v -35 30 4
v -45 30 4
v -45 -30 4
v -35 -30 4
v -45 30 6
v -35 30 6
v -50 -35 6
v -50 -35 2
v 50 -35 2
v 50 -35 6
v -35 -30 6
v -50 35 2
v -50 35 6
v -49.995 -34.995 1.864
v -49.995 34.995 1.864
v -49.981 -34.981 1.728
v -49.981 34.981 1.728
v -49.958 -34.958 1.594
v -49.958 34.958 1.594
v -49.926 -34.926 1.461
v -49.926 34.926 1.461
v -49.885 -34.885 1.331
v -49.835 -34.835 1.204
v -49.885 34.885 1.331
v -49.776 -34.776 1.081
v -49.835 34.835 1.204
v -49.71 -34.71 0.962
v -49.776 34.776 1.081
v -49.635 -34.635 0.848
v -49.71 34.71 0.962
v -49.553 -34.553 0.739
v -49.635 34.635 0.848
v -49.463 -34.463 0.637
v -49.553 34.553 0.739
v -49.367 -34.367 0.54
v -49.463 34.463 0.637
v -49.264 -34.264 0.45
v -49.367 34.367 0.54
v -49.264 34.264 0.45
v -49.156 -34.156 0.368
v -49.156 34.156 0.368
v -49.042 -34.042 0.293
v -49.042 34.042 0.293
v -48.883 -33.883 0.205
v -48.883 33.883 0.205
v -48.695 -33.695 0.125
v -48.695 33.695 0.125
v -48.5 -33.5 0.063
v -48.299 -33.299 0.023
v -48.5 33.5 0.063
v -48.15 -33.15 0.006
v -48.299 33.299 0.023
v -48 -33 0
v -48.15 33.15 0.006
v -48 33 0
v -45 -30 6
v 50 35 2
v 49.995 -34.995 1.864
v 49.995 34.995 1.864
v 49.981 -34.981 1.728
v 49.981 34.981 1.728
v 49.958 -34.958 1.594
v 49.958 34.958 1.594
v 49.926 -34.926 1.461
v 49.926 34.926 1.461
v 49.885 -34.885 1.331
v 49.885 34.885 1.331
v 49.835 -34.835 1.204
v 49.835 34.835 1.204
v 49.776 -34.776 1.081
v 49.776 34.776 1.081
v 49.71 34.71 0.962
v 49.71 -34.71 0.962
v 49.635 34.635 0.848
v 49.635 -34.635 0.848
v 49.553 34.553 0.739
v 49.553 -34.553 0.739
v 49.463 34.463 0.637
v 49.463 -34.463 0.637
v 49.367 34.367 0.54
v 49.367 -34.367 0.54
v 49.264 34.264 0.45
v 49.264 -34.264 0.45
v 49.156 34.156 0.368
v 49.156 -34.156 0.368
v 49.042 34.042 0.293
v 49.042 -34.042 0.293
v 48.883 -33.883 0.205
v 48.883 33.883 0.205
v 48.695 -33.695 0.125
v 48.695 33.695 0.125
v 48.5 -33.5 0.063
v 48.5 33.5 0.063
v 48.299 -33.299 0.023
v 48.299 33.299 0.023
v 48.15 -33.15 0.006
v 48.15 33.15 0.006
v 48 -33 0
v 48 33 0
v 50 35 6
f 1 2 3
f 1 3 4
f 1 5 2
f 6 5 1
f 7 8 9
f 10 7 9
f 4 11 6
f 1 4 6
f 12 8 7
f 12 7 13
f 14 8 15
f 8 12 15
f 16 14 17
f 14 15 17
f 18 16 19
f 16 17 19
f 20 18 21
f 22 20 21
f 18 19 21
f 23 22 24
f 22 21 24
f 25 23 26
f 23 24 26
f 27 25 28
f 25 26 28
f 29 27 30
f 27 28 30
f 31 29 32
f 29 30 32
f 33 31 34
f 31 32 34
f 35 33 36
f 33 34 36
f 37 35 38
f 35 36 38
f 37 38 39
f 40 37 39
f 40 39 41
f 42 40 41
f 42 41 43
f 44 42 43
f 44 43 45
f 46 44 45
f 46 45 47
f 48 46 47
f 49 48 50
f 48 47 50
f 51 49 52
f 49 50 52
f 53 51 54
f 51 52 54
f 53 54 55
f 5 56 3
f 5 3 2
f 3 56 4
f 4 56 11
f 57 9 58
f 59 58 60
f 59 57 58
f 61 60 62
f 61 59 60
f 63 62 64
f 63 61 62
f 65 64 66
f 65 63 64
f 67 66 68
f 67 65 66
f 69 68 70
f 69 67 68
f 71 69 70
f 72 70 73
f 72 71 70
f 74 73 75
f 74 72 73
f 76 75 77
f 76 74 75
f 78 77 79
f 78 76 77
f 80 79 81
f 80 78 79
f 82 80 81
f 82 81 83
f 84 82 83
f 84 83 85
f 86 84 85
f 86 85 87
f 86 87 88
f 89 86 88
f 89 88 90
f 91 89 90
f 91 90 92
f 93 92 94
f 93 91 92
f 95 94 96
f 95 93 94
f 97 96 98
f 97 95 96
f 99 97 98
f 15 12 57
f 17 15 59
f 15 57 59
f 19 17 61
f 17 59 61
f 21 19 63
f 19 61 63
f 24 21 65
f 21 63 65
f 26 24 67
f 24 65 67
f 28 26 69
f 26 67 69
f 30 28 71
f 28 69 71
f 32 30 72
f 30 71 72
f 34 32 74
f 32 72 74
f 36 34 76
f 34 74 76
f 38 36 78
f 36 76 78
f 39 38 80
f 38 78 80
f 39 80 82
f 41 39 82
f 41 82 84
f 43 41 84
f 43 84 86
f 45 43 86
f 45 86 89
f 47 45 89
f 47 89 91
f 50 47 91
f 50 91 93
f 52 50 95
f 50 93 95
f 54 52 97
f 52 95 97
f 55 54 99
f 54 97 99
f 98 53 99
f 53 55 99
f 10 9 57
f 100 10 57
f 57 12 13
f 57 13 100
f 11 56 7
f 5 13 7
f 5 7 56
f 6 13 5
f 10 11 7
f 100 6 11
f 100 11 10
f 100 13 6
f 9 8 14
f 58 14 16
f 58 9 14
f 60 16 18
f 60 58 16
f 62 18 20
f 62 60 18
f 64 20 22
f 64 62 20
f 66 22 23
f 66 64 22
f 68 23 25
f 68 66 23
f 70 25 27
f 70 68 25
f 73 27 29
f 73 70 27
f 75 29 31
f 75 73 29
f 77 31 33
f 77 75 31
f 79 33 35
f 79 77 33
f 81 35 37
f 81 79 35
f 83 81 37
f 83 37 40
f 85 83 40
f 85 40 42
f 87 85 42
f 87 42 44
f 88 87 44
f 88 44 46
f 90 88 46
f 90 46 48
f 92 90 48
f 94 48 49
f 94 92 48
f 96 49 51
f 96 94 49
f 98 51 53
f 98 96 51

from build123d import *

# Parameters (mm, degrees)
F0_W     = 100
F0_H     = 70
F1_DEPTH = 6
F2_R     = 2
F3_W     = 10
F3_H     = 60
F4_DEPTH = 2


with BuildPart() as f1:
    # F0 (on Top) → F1 (new body)
    with BuildSketch(Plane.XY):
        Rectangle(F0_W, F0_H)
    extrude(amount=F1_DEPTH)

    # F2
    f2_edges = [f1.edges().sort_by_distance(p)[0] for p in [
        (0, -35, 0),
        (50, 0, 0),
        (0, 35, 0),
        (-50, 0, 0),
    ]]
    fillet(f2_edges, radius=F2_R)

    # F3 (on face) → F4 (cut)
    with BuildSketch(Plane.XY.offset(6)):
        with Locations((-40, 0)):
            Rectangle(F3_W, F3_H)
    extrude(amount=-F4_DEPTH, mode=Mode.SUBTRACT)


solid = f1.part
